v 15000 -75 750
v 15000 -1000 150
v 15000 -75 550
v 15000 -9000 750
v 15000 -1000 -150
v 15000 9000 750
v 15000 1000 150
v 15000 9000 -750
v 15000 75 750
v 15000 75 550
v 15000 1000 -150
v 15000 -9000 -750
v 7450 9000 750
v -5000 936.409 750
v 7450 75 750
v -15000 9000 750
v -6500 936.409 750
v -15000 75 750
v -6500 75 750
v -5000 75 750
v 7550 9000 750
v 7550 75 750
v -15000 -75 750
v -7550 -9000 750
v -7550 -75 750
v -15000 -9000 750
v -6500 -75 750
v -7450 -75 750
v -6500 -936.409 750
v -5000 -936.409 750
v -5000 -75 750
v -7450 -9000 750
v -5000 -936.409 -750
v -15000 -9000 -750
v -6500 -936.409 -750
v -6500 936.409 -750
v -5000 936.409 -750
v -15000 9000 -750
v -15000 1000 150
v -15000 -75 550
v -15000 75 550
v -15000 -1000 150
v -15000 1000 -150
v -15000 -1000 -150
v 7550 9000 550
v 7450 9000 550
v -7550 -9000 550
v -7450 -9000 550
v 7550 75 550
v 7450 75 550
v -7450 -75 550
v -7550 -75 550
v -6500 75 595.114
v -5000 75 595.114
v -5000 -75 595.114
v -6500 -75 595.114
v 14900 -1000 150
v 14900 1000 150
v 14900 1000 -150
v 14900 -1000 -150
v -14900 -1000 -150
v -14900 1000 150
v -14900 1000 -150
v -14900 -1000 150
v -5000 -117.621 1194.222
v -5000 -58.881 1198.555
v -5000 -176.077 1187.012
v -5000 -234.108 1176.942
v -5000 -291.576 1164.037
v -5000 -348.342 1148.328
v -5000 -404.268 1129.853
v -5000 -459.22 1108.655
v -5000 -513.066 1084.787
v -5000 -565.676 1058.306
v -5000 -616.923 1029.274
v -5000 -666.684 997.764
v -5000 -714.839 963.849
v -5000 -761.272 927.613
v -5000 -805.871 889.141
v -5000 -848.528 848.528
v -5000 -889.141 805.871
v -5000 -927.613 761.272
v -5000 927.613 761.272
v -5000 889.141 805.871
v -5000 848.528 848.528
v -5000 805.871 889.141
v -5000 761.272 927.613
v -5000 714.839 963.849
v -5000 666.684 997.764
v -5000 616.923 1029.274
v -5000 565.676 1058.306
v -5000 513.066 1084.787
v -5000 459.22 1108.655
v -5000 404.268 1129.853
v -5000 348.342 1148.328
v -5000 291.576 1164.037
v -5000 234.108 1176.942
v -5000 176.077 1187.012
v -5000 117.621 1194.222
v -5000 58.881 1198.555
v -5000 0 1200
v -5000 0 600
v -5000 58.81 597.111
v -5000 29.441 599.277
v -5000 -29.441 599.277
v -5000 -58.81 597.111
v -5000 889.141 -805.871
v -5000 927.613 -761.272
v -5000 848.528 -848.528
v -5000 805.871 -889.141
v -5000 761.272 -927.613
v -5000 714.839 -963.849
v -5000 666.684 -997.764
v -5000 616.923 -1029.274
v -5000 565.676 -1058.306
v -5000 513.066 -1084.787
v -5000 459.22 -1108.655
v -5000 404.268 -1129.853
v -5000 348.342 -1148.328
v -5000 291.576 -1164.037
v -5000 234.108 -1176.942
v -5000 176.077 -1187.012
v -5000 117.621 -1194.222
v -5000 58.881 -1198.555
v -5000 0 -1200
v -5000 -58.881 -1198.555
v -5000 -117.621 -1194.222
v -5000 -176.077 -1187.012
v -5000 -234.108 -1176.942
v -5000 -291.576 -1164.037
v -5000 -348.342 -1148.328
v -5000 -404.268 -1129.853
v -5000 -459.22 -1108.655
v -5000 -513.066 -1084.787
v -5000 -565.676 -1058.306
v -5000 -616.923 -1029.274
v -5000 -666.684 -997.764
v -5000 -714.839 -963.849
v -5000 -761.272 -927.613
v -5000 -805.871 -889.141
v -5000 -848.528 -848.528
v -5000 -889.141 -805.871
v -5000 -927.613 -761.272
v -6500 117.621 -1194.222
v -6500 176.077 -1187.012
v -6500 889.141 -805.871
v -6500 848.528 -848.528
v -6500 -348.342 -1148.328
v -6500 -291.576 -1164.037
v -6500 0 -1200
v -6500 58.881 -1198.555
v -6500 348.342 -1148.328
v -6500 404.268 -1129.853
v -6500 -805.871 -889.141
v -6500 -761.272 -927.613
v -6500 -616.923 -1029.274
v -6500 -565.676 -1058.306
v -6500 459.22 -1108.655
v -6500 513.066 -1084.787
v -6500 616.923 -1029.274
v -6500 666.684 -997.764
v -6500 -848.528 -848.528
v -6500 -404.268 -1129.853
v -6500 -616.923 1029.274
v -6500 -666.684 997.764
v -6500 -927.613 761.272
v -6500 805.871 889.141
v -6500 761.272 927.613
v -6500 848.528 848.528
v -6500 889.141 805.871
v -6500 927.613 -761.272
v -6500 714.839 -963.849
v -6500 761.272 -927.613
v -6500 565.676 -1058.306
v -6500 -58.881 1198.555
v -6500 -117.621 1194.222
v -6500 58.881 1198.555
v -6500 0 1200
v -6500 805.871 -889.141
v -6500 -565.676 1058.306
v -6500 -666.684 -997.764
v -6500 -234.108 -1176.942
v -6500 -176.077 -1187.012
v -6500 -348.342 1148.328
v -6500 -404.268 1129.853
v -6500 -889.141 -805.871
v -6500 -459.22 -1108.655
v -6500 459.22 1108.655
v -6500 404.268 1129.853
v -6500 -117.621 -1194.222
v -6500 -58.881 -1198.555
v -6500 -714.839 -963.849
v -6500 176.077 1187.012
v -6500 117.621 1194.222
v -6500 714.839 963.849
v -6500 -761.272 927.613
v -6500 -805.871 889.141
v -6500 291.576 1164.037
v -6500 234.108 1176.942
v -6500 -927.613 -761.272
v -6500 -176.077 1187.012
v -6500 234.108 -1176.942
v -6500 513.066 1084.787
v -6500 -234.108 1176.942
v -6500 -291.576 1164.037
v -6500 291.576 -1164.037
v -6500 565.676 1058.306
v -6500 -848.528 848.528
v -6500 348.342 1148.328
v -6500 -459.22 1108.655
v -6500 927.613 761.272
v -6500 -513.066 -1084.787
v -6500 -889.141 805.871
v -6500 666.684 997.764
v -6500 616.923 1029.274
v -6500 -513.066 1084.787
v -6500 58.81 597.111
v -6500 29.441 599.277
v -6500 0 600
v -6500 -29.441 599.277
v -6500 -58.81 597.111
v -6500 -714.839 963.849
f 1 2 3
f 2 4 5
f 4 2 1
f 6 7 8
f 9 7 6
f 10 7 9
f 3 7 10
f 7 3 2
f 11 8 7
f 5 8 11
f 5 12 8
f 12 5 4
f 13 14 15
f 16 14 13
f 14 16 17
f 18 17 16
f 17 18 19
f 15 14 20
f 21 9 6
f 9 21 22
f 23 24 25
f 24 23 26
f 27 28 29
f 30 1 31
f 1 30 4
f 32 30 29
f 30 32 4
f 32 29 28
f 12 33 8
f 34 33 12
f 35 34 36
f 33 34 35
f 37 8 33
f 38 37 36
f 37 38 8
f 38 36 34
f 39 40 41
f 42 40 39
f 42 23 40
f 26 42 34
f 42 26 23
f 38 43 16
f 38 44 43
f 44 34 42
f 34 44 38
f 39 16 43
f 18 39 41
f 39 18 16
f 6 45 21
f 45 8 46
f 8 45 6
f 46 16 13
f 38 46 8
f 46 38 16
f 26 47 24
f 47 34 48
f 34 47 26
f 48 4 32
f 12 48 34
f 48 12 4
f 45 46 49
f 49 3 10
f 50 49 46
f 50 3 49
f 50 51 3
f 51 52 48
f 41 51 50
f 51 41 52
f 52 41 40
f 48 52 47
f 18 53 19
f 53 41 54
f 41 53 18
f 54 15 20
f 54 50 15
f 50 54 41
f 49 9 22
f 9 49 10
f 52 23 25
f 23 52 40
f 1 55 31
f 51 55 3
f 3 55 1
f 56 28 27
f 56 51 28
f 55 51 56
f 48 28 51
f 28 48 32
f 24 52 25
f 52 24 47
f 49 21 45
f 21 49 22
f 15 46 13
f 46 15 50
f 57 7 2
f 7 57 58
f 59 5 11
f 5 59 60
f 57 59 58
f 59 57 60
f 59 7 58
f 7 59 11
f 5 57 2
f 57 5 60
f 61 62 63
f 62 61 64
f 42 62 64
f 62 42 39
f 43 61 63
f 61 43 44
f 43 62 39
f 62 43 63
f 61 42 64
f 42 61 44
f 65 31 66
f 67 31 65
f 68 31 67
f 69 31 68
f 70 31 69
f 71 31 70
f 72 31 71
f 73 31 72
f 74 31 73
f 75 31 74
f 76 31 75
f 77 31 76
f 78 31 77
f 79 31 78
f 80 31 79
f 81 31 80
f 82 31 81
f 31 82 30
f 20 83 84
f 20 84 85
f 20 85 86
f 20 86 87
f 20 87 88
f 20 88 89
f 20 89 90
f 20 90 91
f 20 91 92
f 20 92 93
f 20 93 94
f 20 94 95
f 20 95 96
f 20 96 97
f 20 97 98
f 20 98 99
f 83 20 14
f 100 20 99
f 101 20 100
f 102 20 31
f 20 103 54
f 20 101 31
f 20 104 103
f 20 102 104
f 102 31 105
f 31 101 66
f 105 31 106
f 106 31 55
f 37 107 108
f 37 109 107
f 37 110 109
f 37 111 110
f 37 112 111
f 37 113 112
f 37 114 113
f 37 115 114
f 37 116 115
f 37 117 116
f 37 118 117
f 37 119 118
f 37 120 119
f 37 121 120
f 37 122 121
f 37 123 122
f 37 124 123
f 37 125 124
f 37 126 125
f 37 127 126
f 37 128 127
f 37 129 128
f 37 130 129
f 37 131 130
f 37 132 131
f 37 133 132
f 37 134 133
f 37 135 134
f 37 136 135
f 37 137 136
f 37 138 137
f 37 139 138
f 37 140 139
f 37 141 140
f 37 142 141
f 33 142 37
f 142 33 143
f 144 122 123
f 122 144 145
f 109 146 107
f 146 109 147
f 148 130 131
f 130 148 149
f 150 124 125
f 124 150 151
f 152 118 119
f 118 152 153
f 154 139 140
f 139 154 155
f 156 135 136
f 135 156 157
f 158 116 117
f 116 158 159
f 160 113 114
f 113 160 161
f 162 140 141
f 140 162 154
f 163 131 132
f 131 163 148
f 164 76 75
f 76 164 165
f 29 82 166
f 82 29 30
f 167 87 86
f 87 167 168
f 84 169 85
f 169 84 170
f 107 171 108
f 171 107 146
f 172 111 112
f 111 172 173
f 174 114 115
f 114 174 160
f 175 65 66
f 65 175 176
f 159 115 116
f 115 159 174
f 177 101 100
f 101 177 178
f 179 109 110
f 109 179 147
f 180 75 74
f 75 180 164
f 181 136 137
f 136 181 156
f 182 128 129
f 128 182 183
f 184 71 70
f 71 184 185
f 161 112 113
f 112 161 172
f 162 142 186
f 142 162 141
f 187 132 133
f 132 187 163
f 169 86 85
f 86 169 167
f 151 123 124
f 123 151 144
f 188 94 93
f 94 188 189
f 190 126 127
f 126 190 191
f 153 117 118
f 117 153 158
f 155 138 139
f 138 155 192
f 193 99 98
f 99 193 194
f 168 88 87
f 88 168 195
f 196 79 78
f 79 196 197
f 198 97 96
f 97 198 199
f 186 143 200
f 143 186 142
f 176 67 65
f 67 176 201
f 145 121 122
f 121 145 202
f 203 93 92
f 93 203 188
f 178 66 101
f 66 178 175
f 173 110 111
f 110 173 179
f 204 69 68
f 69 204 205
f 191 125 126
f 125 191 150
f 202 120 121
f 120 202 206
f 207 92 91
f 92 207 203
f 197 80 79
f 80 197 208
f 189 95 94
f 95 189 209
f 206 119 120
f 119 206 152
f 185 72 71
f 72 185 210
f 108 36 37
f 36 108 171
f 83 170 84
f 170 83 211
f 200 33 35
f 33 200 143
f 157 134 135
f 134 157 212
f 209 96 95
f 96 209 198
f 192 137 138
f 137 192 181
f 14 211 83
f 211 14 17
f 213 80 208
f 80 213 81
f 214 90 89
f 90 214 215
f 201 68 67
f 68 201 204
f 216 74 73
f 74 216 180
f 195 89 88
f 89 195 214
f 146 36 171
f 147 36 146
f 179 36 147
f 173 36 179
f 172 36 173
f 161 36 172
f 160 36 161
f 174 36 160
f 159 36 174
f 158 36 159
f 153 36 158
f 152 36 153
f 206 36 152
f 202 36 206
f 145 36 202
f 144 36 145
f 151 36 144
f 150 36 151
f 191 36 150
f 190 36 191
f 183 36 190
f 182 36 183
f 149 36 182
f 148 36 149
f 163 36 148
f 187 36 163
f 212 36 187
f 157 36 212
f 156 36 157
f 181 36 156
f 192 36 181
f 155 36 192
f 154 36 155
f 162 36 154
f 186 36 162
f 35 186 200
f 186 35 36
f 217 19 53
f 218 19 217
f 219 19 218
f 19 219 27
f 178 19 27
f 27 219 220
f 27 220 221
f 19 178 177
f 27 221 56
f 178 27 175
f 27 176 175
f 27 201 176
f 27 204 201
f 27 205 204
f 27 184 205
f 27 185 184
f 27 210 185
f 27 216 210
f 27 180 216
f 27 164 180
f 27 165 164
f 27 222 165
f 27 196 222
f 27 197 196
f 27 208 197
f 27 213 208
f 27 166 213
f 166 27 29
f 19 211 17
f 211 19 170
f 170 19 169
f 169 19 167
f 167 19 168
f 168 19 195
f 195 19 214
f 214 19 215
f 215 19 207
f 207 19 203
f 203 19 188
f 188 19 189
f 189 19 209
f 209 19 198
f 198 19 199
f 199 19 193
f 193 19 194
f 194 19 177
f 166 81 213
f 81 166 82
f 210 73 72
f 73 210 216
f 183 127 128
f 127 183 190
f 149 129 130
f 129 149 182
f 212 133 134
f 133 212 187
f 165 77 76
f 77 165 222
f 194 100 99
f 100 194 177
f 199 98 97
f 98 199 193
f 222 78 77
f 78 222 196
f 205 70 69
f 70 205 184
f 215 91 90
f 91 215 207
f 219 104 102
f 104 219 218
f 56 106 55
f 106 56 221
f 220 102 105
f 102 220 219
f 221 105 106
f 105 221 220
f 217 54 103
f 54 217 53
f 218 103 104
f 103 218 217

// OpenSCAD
// file: solid_state_harness.scad
// =========================================================================
// GRUMMAN-STYLED INFLATABLE CARRIER - EMBEDDED SOLID-STATE HARNESS
// MANUFACTURER: HUNTINGTON INGALLS / NEWPORT NEWS SHIPBUILDING
// MATERIAL SPECIFICATION: SOLID-STATE CONDUIT IN GRADE 5 TITANIUM
// =========================================================================

module titanium_harness_plate(length=30000, width=18000, thickness=1500) {
    difference() {
        // Core Grade 5 Titanium Flatbed Hinge Plate
        cube([length, width, thickness], center=true);
        
        // Longitudinal Conduit Channel for Embedded 3oz Copper Power Bus
        translate([0, 0, thickness/2 - 100])
            cube([length + 20, 150, 200], center=true);
            
        // Left Divergent Feed for Continuous 12V Blower Power Routing
        translate([-length/4, -width/4, thickness/2 - 100])
            cube([100, width/2, 200], center=true);
            
        // Right Divergent Feed for Submersible Bilge Sump Power Routing
        translate([length/4, width/4, thickness/2 - 100])
            cube([100, width/2, 200], center=true);
            
        // Pocket Cuts at Hinge Faces for Flush 24K Gold Lattice Snap Junctions
        translate([length/2 - 50, 0, 0])
            cube([100, 2000, 300], center=true);
        translate([-length/2 + 50, 0, 0])
            cube([100, 2000, 300], center=true);
    }
}

// Render structural segment with integrated wiring cavities
titanium_harness_plate();
// main file
// =========================================================================
// GRUMMAN-STYLED INFLATABLE CARRIER - STANDALONE TOW-HEAD MODULE
// MANUFACTURER: HUNTINGTON INGALLS / NEWPORT NEWS SHIPBUILDING
// MATERIAL PROFILE: GRADE 5 TITANIUM REINFORCED TOW LOOP EYELET
// =========================================================================

include <solid_state_harness.scad>

module titanium_tow_head_plate(length=10000, width=18000, thickness=1500) {
    difference() {
        // Main Lead Panel Structure
        cube([length, width, thickness], center=true);
        
        // Internal Conduit Cuts for Embedded Solid-State Harness
        translate([0, 0, thickness/2 - 100])
            cube([length + 20, 150, 200], center=true);
            
        // Aft Hinge Interface Pocket for 24K Gold Lattice Snap Connectors
        translate([length/2 - 50, 0, 0])
            cube([100, 2000, 300], center=true);
    }
    
    // Reinforced Solid Titanium Tow Loop Assembly (Accepts Heavy Cable/Rope)
    translate([-length/2 - 750, 0, 0]) {
        difference() {
            // Heavy-duty external eyelet ring extrusion
            rotate([0, 90, 0])
                cylinder(h=1500, r=1200, center=true, $fn=128);
            // Internal loop hole for line/cable clearance (1200mm diameter)
            rotate([0, 90, 0])
                cylinder(h=1600, r=600, center=true, $fn=128);
        }
    }
}

// Instantiate standalone lead tow-head panel
titanium_tow_head_plate();
